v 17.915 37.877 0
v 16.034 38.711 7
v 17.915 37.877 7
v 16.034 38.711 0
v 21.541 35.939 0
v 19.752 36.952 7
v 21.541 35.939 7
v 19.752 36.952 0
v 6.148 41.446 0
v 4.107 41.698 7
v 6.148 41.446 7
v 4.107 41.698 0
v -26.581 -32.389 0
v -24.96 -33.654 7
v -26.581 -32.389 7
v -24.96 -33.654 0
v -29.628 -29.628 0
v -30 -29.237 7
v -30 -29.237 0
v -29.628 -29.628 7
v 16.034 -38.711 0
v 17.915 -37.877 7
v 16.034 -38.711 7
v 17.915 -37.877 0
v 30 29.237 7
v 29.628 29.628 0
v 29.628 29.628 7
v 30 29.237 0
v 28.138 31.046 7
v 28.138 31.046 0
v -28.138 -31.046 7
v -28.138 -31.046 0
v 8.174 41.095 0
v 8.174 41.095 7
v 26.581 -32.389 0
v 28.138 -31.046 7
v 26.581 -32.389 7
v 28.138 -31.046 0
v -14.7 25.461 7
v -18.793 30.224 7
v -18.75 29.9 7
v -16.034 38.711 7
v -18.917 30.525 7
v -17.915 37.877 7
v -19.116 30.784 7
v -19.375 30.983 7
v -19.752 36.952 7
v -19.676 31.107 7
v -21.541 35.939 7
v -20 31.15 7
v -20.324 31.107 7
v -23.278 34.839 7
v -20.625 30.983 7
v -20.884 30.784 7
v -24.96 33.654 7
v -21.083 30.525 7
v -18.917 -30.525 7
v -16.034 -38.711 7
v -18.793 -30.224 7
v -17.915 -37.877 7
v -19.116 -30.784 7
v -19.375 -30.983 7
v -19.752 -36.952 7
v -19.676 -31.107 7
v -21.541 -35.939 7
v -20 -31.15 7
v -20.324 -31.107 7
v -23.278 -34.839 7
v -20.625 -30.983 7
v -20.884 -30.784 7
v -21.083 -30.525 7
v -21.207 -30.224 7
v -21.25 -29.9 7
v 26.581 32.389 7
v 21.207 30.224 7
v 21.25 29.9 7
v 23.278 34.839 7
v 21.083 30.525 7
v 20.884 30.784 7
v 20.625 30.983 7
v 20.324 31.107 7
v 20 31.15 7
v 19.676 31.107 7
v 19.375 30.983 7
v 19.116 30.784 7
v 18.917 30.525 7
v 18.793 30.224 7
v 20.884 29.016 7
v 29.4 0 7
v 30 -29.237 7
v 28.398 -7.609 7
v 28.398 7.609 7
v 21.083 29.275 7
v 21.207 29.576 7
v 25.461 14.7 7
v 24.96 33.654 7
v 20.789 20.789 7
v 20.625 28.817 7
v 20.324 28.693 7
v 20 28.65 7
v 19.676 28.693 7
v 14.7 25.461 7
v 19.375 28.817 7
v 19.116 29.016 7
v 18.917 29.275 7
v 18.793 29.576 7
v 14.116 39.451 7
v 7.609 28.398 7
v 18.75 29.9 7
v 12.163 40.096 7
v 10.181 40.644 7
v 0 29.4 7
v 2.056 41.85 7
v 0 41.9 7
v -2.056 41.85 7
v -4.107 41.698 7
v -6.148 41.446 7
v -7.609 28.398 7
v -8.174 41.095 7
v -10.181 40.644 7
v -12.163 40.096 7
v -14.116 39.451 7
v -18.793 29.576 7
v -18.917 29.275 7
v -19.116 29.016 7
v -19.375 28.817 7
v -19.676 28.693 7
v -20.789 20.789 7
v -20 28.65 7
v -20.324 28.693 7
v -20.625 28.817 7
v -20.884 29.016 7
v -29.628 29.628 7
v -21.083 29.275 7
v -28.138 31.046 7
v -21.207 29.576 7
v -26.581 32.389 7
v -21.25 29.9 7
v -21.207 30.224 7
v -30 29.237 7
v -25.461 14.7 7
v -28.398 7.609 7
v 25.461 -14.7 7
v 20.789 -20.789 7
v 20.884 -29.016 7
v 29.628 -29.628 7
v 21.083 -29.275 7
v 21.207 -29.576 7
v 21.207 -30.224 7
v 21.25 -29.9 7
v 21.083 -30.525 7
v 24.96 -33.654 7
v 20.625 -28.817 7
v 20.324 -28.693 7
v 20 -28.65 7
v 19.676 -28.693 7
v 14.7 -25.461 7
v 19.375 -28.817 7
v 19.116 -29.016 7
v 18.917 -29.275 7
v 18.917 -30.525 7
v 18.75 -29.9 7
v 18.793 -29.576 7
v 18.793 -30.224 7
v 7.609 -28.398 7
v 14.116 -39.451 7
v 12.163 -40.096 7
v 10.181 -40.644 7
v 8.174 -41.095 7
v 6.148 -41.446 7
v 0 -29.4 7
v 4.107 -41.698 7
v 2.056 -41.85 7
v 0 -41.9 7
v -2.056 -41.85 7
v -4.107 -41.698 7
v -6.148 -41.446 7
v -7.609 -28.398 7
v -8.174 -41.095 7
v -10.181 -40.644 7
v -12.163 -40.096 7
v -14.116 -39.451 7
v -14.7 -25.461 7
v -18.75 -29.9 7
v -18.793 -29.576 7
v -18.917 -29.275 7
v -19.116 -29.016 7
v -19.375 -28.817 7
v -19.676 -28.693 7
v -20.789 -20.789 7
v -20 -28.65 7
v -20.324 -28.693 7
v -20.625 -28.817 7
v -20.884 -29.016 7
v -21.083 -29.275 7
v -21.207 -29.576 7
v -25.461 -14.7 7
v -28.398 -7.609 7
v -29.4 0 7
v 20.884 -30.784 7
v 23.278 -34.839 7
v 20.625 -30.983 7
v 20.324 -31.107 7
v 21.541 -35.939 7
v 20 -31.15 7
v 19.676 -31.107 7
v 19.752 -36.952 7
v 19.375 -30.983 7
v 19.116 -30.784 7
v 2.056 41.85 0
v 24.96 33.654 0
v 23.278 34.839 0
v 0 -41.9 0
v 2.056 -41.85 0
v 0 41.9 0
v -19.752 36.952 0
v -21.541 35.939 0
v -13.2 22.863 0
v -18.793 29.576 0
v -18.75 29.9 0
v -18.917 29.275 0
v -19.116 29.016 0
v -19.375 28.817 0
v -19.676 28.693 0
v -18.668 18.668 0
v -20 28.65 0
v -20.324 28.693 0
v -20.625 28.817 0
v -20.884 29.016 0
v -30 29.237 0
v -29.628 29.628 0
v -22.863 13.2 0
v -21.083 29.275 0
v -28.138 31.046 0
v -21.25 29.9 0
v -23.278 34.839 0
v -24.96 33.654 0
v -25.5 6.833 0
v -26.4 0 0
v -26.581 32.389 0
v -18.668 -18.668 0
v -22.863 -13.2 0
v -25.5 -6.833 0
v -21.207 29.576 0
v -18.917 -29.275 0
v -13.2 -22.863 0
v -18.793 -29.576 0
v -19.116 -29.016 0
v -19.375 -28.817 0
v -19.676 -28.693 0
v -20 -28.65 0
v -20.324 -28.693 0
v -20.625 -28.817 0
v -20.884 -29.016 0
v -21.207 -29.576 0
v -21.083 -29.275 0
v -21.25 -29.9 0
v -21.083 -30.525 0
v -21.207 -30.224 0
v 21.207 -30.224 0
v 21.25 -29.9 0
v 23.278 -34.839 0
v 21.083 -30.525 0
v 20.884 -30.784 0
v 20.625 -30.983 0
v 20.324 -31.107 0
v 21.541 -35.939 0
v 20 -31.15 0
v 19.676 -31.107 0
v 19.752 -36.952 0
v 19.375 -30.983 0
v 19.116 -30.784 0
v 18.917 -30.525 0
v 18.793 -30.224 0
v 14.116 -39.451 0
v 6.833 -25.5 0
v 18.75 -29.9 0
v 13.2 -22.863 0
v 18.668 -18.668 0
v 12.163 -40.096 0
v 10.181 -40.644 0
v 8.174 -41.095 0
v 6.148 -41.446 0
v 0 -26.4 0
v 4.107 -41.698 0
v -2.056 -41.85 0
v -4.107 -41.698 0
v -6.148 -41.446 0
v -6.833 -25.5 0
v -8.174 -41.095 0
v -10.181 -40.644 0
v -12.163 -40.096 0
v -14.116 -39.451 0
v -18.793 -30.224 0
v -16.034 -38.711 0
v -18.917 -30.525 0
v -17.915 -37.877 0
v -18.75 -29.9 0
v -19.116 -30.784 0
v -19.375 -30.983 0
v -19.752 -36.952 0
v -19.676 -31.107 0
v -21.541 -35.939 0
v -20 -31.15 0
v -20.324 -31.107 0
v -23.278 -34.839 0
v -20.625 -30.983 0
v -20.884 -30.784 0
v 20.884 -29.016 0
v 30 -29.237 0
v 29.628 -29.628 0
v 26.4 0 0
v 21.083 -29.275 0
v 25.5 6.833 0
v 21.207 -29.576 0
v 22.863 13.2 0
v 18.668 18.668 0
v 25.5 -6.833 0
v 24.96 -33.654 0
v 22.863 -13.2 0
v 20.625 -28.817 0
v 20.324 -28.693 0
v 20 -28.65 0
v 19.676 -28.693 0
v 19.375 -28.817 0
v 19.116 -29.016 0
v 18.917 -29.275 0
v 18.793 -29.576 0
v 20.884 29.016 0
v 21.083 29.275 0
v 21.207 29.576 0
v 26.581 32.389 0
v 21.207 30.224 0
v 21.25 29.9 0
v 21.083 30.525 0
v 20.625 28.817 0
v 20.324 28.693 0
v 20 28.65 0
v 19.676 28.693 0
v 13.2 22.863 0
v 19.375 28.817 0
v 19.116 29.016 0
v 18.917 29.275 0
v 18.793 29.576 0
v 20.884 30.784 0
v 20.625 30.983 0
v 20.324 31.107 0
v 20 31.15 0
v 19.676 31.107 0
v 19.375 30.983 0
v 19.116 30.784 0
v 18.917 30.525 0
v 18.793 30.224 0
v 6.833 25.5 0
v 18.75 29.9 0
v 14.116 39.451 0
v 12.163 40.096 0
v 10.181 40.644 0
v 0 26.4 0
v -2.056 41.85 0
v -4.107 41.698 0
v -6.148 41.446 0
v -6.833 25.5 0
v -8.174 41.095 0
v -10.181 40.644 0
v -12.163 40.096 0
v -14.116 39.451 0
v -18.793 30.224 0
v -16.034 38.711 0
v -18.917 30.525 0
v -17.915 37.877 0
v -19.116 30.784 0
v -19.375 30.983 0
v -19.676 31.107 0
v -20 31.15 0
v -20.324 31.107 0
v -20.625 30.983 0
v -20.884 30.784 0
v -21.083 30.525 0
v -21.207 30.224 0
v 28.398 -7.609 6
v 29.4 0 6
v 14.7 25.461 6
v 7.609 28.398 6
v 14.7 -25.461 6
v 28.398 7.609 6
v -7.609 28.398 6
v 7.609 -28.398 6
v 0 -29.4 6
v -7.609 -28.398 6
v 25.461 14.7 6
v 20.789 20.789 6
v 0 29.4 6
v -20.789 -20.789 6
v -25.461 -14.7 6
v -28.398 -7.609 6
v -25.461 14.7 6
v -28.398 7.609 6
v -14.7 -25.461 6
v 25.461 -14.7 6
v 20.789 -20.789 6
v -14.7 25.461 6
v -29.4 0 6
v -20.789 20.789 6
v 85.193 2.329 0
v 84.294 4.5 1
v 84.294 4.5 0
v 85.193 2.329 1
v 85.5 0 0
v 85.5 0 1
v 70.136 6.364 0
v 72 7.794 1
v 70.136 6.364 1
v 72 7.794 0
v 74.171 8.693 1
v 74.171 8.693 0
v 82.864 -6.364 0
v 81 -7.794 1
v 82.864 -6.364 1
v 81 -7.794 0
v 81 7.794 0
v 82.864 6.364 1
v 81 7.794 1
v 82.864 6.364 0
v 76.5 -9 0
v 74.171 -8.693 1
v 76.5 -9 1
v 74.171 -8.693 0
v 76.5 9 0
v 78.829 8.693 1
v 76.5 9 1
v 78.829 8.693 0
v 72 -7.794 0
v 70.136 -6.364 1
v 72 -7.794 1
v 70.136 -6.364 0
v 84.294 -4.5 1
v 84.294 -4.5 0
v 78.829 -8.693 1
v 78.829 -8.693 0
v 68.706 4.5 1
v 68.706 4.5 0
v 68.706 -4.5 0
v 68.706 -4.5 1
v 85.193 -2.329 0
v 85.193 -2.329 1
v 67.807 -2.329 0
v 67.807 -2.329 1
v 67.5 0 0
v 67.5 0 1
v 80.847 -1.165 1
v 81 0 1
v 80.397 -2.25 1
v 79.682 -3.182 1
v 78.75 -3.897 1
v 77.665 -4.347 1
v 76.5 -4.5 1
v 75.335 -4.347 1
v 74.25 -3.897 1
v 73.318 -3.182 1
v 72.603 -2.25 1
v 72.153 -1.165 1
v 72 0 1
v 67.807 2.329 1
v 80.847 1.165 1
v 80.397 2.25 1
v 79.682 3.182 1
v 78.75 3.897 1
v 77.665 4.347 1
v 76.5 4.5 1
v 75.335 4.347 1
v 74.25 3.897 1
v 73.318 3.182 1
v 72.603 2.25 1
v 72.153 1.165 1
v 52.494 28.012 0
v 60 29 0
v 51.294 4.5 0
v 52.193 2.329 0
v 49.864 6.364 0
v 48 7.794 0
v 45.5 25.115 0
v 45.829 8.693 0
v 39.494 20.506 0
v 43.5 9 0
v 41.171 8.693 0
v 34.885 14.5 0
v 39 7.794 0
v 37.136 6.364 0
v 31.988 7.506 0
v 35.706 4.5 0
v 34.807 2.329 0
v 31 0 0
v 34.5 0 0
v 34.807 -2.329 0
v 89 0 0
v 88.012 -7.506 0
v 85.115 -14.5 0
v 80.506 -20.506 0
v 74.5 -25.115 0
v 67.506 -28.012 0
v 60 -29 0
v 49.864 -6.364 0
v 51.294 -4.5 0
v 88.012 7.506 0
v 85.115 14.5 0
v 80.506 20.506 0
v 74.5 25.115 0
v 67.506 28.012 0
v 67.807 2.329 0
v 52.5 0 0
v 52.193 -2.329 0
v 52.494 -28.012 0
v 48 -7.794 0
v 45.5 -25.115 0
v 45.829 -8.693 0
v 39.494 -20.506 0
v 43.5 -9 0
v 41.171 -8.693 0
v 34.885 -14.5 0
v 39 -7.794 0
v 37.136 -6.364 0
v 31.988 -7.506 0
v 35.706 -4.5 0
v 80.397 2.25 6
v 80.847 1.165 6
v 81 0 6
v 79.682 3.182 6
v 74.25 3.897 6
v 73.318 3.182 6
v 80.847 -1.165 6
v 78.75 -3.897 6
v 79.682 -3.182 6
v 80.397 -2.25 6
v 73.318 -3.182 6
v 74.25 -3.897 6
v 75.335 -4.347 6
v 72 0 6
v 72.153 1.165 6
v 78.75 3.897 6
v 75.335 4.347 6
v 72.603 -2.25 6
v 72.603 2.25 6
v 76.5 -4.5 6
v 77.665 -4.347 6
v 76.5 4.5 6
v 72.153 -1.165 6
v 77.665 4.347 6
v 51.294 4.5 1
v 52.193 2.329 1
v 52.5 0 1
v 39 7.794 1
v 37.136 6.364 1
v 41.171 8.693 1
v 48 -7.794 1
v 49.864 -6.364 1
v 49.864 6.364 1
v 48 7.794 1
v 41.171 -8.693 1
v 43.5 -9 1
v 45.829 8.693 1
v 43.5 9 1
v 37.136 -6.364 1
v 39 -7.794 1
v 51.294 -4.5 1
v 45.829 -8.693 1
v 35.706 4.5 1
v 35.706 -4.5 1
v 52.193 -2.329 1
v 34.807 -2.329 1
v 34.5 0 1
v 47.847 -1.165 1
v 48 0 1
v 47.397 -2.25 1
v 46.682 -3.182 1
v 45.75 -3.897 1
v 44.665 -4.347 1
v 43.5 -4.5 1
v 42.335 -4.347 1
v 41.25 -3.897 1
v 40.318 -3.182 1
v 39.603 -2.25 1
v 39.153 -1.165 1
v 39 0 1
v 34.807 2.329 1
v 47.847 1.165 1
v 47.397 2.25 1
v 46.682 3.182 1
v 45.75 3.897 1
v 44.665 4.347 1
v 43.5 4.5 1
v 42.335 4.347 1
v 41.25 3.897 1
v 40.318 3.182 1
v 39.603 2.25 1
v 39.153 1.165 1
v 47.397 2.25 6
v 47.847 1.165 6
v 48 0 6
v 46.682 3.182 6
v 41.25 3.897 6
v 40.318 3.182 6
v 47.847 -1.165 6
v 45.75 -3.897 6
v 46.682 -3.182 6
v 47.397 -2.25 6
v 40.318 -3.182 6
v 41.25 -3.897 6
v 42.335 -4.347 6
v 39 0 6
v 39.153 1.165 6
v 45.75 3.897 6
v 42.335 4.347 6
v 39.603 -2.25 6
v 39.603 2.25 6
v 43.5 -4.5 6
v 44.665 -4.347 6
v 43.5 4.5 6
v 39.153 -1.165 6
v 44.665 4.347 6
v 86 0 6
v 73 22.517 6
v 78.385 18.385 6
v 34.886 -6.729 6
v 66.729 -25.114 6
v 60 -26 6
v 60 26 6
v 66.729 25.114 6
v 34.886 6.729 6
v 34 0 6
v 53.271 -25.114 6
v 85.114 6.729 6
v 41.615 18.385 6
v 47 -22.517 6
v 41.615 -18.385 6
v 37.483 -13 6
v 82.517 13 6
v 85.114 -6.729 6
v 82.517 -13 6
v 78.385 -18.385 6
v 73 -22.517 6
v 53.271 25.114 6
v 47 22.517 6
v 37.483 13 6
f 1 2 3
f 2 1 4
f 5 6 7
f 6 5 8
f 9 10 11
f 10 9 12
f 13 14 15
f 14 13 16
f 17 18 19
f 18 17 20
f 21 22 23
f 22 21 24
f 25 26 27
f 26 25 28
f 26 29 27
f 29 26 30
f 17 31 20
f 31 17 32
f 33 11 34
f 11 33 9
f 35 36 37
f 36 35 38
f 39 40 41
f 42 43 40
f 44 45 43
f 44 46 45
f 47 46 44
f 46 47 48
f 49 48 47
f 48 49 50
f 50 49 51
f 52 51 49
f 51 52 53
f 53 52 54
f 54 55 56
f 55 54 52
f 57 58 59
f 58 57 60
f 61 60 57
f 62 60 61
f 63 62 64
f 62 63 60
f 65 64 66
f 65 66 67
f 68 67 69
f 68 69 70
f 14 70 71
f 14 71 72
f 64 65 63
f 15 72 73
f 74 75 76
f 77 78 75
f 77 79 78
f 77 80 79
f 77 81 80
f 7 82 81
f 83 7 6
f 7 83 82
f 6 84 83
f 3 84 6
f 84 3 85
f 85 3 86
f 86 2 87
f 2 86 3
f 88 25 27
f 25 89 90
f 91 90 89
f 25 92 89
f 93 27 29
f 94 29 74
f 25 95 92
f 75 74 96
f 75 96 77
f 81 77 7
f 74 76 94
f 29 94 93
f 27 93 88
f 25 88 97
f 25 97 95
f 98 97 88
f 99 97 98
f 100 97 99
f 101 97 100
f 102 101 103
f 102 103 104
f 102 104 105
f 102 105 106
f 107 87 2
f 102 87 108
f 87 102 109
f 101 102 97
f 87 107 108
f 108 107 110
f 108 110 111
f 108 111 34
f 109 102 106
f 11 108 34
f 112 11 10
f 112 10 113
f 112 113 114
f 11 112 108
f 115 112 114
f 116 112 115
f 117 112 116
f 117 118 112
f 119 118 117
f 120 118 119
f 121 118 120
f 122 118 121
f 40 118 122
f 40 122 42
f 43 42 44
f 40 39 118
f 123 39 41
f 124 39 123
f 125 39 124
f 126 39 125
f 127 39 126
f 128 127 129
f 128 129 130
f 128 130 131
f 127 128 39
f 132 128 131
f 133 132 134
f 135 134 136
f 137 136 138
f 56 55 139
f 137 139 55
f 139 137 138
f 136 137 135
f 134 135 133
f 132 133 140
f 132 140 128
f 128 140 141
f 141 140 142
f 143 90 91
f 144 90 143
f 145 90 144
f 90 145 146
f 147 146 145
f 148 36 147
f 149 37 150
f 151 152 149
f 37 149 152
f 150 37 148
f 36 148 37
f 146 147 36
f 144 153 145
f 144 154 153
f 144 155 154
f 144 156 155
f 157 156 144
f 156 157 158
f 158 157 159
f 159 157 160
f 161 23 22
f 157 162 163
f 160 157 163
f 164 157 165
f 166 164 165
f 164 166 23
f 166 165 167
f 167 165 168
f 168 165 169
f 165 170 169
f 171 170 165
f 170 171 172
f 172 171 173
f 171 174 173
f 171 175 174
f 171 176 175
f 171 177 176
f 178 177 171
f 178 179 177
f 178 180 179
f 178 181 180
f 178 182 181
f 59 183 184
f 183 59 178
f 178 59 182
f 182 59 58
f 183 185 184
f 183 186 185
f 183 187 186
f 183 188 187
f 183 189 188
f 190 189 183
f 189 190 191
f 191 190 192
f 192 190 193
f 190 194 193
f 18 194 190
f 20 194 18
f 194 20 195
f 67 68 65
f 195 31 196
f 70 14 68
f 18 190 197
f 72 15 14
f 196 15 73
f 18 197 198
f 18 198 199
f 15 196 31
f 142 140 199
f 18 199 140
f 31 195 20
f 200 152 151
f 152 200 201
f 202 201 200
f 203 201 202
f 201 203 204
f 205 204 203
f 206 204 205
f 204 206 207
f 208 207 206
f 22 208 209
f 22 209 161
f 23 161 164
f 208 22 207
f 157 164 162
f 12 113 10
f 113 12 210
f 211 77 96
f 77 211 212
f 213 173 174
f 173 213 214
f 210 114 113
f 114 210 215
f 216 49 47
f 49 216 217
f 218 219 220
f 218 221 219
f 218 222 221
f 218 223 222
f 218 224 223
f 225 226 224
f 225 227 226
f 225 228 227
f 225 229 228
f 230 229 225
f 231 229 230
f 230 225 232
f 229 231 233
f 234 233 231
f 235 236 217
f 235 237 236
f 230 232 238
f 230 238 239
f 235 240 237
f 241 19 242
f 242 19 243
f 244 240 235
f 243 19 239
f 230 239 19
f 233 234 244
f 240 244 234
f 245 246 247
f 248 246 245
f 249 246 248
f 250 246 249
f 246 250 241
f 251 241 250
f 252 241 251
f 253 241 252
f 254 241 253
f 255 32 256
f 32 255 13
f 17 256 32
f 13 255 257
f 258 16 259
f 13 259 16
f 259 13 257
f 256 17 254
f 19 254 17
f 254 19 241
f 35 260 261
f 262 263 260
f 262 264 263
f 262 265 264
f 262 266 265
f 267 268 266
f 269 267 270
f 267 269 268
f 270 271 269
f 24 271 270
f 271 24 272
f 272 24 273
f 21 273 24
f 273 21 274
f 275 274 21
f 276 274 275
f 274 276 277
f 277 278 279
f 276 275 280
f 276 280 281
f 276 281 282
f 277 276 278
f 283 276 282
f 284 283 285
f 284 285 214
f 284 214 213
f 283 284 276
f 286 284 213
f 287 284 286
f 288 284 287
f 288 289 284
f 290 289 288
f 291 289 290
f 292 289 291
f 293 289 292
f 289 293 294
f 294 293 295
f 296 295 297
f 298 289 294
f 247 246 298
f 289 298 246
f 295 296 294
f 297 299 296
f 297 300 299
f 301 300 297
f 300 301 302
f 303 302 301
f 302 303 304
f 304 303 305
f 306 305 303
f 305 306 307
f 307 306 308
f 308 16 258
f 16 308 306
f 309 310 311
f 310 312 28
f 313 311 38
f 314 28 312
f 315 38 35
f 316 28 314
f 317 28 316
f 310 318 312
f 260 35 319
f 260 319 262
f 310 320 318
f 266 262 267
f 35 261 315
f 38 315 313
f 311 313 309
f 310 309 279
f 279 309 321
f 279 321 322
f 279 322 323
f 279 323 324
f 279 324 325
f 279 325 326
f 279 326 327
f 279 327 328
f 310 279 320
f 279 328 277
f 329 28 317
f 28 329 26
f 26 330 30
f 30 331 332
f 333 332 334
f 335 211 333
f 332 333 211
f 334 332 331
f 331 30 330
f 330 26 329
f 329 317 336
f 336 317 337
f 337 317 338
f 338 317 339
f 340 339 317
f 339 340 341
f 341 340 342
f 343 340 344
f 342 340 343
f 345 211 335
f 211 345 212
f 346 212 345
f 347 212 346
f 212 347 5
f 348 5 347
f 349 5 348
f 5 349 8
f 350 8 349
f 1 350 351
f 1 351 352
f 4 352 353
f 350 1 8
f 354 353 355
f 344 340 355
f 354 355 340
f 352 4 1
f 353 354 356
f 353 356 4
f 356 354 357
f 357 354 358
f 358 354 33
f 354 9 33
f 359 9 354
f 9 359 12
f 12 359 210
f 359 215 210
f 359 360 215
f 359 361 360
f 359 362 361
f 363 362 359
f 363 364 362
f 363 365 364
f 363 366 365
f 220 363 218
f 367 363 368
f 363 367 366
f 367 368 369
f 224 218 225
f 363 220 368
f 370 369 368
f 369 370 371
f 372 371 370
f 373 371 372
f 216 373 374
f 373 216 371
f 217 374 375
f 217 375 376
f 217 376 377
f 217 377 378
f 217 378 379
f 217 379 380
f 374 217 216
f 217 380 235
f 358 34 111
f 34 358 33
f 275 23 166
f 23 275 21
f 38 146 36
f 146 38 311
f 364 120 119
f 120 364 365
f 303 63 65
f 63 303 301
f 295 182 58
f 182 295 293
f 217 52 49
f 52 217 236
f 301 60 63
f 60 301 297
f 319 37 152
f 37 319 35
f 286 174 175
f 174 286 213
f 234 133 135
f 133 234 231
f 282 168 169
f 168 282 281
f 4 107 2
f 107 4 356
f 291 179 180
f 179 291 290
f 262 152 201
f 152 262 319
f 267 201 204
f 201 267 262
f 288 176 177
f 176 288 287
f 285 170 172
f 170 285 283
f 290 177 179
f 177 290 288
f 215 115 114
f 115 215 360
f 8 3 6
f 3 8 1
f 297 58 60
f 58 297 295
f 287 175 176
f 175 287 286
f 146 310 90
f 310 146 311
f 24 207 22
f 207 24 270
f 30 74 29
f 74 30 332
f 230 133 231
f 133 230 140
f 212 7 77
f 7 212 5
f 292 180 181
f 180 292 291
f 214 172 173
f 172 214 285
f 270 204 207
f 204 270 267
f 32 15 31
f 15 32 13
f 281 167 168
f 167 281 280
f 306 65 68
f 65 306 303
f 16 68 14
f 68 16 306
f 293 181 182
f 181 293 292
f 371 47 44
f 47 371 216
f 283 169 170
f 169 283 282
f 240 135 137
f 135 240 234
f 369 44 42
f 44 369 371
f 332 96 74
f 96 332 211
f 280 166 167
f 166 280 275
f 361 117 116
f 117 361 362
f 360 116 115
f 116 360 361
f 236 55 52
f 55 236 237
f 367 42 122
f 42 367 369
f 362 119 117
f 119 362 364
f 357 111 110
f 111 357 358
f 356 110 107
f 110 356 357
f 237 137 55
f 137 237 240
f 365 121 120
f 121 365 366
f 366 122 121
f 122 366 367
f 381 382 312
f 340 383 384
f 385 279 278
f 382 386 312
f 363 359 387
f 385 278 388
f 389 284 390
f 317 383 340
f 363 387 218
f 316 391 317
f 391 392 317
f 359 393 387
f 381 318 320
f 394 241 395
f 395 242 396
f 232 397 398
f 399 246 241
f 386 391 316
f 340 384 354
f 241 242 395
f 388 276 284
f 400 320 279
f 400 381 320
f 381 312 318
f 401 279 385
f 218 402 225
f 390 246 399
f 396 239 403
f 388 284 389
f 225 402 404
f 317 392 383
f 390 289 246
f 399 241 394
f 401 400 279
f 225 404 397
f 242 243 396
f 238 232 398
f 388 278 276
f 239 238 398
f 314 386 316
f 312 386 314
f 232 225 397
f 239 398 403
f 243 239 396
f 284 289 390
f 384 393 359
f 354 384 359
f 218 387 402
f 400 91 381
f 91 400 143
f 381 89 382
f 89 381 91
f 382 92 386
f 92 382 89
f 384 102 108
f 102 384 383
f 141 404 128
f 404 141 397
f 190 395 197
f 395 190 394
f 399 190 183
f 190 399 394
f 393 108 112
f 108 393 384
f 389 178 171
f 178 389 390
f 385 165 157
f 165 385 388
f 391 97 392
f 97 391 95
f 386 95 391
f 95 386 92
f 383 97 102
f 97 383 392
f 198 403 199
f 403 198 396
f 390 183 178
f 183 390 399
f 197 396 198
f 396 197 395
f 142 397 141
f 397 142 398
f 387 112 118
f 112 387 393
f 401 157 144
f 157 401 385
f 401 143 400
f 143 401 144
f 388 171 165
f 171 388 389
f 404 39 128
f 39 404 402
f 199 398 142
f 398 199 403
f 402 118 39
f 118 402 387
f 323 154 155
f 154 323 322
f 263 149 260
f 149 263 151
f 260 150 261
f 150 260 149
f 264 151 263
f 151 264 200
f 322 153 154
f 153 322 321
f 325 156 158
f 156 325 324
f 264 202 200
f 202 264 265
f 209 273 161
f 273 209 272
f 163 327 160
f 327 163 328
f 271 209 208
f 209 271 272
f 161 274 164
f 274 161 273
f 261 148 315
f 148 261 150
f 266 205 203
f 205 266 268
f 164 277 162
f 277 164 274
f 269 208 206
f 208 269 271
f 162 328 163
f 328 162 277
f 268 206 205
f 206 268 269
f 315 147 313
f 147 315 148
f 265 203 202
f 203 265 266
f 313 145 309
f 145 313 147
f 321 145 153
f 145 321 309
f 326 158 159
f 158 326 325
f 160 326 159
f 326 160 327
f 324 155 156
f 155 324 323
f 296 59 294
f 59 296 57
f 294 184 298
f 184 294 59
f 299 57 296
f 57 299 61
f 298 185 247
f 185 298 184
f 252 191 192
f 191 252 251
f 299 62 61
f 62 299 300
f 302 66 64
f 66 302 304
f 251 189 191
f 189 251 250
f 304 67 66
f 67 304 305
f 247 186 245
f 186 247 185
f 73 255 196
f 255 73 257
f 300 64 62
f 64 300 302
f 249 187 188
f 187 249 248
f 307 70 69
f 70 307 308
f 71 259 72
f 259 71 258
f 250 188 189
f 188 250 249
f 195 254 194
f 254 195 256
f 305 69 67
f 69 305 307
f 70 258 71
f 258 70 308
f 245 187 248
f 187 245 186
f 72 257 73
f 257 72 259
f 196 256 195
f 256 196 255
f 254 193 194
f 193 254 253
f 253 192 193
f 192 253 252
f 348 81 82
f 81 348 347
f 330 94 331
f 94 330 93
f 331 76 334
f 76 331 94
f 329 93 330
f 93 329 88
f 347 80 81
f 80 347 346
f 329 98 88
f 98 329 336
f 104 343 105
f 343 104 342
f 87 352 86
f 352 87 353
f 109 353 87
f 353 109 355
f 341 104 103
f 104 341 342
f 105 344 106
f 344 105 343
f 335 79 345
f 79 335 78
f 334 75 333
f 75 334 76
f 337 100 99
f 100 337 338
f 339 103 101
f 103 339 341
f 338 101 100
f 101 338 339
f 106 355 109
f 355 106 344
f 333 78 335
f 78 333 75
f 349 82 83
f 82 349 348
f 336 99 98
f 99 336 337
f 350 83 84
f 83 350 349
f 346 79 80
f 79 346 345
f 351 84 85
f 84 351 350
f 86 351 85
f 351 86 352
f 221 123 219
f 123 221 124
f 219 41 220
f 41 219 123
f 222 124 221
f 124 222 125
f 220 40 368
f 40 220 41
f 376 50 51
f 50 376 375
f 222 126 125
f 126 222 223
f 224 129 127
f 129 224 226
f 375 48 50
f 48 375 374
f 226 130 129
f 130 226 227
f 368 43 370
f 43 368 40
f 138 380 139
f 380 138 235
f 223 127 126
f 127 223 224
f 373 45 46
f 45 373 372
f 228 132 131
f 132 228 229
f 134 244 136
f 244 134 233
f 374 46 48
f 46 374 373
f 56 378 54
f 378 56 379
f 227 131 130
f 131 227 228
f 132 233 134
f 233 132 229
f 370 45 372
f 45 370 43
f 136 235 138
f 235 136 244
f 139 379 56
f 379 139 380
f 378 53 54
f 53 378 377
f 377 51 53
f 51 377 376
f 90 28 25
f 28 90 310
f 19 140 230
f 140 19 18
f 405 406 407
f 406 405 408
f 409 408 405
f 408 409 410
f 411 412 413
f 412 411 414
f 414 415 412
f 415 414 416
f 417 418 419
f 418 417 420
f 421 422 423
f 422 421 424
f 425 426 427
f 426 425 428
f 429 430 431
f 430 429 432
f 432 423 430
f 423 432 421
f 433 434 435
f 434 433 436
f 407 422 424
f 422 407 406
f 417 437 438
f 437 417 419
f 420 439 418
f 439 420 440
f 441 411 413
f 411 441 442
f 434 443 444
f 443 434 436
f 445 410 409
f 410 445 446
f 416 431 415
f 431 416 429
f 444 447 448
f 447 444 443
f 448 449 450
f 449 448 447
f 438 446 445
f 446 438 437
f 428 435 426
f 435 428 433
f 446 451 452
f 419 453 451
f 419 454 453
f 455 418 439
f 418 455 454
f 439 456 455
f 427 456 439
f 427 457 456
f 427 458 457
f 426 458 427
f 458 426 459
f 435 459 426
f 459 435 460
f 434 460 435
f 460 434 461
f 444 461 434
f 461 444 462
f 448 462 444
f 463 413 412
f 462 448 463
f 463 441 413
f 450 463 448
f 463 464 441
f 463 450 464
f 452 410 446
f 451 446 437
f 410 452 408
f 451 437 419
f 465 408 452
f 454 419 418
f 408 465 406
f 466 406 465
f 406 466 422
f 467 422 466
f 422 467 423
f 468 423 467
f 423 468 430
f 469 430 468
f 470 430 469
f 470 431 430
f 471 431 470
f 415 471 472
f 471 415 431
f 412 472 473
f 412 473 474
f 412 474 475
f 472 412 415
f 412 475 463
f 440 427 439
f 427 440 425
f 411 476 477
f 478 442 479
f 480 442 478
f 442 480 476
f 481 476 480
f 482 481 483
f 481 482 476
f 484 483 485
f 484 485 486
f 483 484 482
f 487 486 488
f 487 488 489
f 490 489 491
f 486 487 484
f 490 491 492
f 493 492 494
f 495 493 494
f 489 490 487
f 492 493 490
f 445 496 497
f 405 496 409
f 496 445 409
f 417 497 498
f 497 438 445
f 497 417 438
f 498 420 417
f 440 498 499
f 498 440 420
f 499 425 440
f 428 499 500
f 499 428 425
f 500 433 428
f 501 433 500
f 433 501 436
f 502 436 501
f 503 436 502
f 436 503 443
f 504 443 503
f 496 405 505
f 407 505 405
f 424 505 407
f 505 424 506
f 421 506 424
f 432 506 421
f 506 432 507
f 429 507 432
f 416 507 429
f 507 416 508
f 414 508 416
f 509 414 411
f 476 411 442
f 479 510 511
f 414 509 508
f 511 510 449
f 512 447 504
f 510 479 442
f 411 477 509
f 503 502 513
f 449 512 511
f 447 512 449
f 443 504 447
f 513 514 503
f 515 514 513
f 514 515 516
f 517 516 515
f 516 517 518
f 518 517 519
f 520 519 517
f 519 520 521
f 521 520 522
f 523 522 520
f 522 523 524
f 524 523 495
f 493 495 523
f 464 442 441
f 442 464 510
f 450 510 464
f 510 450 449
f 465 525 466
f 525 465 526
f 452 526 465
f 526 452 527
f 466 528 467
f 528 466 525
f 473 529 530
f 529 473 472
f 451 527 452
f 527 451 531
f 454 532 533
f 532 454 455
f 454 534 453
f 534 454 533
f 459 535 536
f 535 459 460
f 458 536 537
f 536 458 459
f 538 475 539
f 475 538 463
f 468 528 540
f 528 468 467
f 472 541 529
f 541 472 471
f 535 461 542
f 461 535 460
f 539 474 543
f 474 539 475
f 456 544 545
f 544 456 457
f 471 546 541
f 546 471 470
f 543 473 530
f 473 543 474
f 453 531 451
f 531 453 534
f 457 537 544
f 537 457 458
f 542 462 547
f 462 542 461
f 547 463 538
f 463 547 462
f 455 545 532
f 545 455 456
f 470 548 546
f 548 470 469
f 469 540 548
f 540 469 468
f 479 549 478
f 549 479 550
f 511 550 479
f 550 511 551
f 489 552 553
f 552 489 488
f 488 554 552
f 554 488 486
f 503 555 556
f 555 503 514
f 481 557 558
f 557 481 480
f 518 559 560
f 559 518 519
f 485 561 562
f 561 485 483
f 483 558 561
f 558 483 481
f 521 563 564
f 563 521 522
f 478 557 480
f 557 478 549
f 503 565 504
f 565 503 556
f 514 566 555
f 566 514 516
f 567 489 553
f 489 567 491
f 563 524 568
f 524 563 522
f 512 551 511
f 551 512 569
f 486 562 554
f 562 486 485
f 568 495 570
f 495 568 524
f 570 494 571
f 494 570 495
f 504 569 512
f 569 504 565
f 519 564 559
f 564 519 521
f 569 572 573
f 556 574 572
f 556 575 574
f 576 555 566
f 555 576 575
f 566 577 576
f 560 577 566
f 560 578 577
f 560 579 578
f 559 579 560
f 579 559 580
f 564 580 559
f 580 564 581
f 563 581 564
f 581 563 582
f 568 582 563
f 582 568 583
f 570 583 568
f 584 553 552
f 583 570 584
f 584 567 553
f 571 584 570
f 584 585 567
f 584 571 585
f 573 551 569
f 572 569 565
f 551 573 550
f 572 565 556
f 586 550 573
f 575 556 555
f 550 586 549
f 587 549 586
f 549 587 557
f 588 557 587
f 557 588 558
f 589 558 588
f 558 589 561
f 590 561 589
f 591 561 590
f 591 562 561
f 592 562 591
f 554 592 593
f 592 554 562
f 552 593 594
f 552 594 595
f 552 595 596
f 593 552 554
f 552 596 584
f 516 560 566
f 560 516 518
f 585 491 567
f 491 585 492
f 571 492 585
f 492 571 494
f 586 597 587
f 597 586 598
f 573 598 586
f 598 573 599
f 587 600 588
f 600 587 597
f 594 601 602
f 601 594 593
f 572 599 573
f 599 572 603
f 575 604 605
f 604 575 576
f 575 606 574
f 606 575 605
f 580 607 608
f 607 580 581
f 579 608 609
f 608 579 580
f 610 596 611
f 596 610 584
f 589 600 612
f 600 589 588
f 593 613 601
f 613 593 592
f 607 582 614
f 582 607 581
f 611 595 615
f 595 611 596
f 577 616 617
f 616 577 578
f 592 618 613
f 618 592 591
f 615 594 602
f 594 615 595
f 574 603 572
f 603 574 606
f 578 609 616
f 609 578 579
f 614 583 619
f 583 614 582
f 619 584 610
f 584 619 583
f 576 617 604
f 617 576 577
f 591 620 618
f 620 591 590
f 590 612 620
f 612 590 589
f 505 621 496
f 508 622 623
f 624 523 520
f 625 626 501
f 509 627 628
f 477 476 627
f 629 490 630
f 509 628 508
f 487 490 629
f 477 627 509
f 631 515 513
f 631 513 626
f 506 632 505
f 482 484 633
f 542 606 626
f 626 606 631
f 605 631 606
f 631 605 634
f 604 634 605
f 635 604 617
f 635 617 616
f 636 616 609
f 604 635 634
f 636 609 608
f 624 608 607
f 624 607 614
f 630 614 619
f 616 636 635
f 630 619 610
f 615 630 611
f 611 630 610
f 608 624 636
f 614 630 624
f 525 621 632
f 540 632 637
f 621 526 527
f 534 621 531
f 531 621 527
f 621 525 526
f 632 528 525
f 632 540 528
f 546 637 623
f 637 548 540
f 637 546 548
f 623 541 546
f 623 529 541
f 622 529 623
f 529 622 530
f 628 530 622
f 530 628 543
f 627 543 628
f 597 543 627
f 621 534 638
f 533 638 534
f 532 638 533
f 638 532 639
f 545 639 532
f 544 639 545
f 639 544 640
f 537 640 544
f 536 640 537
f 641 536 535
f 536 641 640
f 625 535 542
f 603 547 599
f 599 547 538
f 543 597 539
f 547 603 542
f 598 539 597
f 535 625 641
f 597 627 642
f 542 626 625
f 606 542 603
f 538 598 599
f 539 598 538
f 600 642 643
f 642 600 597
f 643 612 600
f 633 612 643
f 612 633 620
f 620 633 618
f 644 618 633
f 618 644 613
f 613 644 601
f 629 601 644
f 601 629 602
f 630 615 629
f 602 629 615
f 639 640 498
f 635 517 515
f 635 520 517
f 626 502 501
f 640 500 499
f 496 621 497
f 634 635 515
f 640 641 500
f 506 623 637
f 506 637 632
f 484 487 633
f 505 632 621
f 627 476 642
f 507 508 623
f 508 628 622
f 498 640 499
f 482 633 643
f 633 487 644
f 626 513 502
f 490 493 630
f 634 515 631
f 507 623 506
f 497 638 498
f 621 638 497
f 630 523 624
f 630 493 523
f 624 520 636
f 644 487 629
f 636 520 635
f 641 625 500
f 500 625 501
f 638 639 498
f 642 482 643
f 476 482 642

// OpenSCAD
max_x=60;
inner_gap=33;
inner_screw_d=9;
outer_screw_d=2.5;

x_plus=3;
y_plus=2;

y_off=1;

y_ges=2*x_plus+y_plus+y_off;

inner_outer_gap=0.4;

padding=5;

res=24;
h=6;

translate([0,0,h+1])
rotate([180,0,0])
intersection(){
  cube([max_x,1000,1000],center=true);
    outer();
  }
translate([max_x,0,0])
inner();

module outer(){
  /*
                ______________
                 \      ||   |
                  |     ||   |
                /       ||   |
               |________||___|
  */
  outer_x = inner_gap/2+inner_screw_d/2+padding+inner_outer_gap;
  outer_x_max=outer_x+x_plus+padding+outer_screw_d+padding;
  difference(){
    cylinder(h=h+1,r=outer_x_max,$fn=128);
    translate([0,0,1])
    cylinder(h=h,r2=outer_x, r1=outer_x+x_plus,$fn=res);
    cylinder(h=1, r=outer_x+x_plus,$fn=res);
    // rotate_extrude($fn=res) 
    // polygon( points=[
    //   [outer_x,0],
    //   [outer_x_max,0],
    //   [outer_x_max,y_ges],
    //   [outer_x,y_ges],
    //   [outer_x+x_plus,y_ges-x_plus],
    //   [outer_x+x_plus,y_ges-x_plus-y_plus],
    //   [outer_x,y_ges-x_plus-y_plus-x_plus],
    //   [outer_x,y_off],
    // ]);
    translate([20,outer_x_max-12,0])
    cylinder(d=outer_screw_d,h=y_ges,$fn=res);
    translate([-20,outer_x_max-12,0])
    cylinder(d=outer_screw_d,h=y_ges,$fn=res);
    translate([20,-(outer_x_max-12),0])
    cylinder(d=outer_screw_d,h=y_ges,$fn=res);
    translate([-20,-(outer_x_max-12),0])
    cylinder(d=outer_screw_d,h=y_ges,$fn=res);
  }
}
module inner(){
  /*
  ____________
 |             \
 |_______________\

  */
  inner_x = inner_gap/2+inner_screw_d/2+padding;
  // translate([0,0,y_off])
  difference(){
    cylinder(h=h,r2=inner_x, r1=inner_x+x_plus,$fn=res);
    // rotate_extrude($fn=res) 
    // polygon( points=[
    //   [0,0],
    //   [inner_x,0],
    //   [inner_x+x_plus,x_plus],
    //   [inner_x+x_plus,x_plus+y_plus],
    //   [inner_x,x_plus+y_plus+x_plus],
    //   [inner_x,y_ges],
    //   [0,y_ges],
    // ]);
    translate([inner_gap/2,0,0])
    union(){
      cylinder(d=inner_screw_d*2,h=1,$fn=res);
      cylinder(d=inner_screw_d,h=y_ges,$fn=res);
    }
    translate([-inner_gap/2,0,0])
    union(){
      cylinder(d=inner_screw_d*2,h=1,$fn=res);
      cylinder(d=inner_screw_d,h=y_ges,$fn=res);
    }
  }
}
